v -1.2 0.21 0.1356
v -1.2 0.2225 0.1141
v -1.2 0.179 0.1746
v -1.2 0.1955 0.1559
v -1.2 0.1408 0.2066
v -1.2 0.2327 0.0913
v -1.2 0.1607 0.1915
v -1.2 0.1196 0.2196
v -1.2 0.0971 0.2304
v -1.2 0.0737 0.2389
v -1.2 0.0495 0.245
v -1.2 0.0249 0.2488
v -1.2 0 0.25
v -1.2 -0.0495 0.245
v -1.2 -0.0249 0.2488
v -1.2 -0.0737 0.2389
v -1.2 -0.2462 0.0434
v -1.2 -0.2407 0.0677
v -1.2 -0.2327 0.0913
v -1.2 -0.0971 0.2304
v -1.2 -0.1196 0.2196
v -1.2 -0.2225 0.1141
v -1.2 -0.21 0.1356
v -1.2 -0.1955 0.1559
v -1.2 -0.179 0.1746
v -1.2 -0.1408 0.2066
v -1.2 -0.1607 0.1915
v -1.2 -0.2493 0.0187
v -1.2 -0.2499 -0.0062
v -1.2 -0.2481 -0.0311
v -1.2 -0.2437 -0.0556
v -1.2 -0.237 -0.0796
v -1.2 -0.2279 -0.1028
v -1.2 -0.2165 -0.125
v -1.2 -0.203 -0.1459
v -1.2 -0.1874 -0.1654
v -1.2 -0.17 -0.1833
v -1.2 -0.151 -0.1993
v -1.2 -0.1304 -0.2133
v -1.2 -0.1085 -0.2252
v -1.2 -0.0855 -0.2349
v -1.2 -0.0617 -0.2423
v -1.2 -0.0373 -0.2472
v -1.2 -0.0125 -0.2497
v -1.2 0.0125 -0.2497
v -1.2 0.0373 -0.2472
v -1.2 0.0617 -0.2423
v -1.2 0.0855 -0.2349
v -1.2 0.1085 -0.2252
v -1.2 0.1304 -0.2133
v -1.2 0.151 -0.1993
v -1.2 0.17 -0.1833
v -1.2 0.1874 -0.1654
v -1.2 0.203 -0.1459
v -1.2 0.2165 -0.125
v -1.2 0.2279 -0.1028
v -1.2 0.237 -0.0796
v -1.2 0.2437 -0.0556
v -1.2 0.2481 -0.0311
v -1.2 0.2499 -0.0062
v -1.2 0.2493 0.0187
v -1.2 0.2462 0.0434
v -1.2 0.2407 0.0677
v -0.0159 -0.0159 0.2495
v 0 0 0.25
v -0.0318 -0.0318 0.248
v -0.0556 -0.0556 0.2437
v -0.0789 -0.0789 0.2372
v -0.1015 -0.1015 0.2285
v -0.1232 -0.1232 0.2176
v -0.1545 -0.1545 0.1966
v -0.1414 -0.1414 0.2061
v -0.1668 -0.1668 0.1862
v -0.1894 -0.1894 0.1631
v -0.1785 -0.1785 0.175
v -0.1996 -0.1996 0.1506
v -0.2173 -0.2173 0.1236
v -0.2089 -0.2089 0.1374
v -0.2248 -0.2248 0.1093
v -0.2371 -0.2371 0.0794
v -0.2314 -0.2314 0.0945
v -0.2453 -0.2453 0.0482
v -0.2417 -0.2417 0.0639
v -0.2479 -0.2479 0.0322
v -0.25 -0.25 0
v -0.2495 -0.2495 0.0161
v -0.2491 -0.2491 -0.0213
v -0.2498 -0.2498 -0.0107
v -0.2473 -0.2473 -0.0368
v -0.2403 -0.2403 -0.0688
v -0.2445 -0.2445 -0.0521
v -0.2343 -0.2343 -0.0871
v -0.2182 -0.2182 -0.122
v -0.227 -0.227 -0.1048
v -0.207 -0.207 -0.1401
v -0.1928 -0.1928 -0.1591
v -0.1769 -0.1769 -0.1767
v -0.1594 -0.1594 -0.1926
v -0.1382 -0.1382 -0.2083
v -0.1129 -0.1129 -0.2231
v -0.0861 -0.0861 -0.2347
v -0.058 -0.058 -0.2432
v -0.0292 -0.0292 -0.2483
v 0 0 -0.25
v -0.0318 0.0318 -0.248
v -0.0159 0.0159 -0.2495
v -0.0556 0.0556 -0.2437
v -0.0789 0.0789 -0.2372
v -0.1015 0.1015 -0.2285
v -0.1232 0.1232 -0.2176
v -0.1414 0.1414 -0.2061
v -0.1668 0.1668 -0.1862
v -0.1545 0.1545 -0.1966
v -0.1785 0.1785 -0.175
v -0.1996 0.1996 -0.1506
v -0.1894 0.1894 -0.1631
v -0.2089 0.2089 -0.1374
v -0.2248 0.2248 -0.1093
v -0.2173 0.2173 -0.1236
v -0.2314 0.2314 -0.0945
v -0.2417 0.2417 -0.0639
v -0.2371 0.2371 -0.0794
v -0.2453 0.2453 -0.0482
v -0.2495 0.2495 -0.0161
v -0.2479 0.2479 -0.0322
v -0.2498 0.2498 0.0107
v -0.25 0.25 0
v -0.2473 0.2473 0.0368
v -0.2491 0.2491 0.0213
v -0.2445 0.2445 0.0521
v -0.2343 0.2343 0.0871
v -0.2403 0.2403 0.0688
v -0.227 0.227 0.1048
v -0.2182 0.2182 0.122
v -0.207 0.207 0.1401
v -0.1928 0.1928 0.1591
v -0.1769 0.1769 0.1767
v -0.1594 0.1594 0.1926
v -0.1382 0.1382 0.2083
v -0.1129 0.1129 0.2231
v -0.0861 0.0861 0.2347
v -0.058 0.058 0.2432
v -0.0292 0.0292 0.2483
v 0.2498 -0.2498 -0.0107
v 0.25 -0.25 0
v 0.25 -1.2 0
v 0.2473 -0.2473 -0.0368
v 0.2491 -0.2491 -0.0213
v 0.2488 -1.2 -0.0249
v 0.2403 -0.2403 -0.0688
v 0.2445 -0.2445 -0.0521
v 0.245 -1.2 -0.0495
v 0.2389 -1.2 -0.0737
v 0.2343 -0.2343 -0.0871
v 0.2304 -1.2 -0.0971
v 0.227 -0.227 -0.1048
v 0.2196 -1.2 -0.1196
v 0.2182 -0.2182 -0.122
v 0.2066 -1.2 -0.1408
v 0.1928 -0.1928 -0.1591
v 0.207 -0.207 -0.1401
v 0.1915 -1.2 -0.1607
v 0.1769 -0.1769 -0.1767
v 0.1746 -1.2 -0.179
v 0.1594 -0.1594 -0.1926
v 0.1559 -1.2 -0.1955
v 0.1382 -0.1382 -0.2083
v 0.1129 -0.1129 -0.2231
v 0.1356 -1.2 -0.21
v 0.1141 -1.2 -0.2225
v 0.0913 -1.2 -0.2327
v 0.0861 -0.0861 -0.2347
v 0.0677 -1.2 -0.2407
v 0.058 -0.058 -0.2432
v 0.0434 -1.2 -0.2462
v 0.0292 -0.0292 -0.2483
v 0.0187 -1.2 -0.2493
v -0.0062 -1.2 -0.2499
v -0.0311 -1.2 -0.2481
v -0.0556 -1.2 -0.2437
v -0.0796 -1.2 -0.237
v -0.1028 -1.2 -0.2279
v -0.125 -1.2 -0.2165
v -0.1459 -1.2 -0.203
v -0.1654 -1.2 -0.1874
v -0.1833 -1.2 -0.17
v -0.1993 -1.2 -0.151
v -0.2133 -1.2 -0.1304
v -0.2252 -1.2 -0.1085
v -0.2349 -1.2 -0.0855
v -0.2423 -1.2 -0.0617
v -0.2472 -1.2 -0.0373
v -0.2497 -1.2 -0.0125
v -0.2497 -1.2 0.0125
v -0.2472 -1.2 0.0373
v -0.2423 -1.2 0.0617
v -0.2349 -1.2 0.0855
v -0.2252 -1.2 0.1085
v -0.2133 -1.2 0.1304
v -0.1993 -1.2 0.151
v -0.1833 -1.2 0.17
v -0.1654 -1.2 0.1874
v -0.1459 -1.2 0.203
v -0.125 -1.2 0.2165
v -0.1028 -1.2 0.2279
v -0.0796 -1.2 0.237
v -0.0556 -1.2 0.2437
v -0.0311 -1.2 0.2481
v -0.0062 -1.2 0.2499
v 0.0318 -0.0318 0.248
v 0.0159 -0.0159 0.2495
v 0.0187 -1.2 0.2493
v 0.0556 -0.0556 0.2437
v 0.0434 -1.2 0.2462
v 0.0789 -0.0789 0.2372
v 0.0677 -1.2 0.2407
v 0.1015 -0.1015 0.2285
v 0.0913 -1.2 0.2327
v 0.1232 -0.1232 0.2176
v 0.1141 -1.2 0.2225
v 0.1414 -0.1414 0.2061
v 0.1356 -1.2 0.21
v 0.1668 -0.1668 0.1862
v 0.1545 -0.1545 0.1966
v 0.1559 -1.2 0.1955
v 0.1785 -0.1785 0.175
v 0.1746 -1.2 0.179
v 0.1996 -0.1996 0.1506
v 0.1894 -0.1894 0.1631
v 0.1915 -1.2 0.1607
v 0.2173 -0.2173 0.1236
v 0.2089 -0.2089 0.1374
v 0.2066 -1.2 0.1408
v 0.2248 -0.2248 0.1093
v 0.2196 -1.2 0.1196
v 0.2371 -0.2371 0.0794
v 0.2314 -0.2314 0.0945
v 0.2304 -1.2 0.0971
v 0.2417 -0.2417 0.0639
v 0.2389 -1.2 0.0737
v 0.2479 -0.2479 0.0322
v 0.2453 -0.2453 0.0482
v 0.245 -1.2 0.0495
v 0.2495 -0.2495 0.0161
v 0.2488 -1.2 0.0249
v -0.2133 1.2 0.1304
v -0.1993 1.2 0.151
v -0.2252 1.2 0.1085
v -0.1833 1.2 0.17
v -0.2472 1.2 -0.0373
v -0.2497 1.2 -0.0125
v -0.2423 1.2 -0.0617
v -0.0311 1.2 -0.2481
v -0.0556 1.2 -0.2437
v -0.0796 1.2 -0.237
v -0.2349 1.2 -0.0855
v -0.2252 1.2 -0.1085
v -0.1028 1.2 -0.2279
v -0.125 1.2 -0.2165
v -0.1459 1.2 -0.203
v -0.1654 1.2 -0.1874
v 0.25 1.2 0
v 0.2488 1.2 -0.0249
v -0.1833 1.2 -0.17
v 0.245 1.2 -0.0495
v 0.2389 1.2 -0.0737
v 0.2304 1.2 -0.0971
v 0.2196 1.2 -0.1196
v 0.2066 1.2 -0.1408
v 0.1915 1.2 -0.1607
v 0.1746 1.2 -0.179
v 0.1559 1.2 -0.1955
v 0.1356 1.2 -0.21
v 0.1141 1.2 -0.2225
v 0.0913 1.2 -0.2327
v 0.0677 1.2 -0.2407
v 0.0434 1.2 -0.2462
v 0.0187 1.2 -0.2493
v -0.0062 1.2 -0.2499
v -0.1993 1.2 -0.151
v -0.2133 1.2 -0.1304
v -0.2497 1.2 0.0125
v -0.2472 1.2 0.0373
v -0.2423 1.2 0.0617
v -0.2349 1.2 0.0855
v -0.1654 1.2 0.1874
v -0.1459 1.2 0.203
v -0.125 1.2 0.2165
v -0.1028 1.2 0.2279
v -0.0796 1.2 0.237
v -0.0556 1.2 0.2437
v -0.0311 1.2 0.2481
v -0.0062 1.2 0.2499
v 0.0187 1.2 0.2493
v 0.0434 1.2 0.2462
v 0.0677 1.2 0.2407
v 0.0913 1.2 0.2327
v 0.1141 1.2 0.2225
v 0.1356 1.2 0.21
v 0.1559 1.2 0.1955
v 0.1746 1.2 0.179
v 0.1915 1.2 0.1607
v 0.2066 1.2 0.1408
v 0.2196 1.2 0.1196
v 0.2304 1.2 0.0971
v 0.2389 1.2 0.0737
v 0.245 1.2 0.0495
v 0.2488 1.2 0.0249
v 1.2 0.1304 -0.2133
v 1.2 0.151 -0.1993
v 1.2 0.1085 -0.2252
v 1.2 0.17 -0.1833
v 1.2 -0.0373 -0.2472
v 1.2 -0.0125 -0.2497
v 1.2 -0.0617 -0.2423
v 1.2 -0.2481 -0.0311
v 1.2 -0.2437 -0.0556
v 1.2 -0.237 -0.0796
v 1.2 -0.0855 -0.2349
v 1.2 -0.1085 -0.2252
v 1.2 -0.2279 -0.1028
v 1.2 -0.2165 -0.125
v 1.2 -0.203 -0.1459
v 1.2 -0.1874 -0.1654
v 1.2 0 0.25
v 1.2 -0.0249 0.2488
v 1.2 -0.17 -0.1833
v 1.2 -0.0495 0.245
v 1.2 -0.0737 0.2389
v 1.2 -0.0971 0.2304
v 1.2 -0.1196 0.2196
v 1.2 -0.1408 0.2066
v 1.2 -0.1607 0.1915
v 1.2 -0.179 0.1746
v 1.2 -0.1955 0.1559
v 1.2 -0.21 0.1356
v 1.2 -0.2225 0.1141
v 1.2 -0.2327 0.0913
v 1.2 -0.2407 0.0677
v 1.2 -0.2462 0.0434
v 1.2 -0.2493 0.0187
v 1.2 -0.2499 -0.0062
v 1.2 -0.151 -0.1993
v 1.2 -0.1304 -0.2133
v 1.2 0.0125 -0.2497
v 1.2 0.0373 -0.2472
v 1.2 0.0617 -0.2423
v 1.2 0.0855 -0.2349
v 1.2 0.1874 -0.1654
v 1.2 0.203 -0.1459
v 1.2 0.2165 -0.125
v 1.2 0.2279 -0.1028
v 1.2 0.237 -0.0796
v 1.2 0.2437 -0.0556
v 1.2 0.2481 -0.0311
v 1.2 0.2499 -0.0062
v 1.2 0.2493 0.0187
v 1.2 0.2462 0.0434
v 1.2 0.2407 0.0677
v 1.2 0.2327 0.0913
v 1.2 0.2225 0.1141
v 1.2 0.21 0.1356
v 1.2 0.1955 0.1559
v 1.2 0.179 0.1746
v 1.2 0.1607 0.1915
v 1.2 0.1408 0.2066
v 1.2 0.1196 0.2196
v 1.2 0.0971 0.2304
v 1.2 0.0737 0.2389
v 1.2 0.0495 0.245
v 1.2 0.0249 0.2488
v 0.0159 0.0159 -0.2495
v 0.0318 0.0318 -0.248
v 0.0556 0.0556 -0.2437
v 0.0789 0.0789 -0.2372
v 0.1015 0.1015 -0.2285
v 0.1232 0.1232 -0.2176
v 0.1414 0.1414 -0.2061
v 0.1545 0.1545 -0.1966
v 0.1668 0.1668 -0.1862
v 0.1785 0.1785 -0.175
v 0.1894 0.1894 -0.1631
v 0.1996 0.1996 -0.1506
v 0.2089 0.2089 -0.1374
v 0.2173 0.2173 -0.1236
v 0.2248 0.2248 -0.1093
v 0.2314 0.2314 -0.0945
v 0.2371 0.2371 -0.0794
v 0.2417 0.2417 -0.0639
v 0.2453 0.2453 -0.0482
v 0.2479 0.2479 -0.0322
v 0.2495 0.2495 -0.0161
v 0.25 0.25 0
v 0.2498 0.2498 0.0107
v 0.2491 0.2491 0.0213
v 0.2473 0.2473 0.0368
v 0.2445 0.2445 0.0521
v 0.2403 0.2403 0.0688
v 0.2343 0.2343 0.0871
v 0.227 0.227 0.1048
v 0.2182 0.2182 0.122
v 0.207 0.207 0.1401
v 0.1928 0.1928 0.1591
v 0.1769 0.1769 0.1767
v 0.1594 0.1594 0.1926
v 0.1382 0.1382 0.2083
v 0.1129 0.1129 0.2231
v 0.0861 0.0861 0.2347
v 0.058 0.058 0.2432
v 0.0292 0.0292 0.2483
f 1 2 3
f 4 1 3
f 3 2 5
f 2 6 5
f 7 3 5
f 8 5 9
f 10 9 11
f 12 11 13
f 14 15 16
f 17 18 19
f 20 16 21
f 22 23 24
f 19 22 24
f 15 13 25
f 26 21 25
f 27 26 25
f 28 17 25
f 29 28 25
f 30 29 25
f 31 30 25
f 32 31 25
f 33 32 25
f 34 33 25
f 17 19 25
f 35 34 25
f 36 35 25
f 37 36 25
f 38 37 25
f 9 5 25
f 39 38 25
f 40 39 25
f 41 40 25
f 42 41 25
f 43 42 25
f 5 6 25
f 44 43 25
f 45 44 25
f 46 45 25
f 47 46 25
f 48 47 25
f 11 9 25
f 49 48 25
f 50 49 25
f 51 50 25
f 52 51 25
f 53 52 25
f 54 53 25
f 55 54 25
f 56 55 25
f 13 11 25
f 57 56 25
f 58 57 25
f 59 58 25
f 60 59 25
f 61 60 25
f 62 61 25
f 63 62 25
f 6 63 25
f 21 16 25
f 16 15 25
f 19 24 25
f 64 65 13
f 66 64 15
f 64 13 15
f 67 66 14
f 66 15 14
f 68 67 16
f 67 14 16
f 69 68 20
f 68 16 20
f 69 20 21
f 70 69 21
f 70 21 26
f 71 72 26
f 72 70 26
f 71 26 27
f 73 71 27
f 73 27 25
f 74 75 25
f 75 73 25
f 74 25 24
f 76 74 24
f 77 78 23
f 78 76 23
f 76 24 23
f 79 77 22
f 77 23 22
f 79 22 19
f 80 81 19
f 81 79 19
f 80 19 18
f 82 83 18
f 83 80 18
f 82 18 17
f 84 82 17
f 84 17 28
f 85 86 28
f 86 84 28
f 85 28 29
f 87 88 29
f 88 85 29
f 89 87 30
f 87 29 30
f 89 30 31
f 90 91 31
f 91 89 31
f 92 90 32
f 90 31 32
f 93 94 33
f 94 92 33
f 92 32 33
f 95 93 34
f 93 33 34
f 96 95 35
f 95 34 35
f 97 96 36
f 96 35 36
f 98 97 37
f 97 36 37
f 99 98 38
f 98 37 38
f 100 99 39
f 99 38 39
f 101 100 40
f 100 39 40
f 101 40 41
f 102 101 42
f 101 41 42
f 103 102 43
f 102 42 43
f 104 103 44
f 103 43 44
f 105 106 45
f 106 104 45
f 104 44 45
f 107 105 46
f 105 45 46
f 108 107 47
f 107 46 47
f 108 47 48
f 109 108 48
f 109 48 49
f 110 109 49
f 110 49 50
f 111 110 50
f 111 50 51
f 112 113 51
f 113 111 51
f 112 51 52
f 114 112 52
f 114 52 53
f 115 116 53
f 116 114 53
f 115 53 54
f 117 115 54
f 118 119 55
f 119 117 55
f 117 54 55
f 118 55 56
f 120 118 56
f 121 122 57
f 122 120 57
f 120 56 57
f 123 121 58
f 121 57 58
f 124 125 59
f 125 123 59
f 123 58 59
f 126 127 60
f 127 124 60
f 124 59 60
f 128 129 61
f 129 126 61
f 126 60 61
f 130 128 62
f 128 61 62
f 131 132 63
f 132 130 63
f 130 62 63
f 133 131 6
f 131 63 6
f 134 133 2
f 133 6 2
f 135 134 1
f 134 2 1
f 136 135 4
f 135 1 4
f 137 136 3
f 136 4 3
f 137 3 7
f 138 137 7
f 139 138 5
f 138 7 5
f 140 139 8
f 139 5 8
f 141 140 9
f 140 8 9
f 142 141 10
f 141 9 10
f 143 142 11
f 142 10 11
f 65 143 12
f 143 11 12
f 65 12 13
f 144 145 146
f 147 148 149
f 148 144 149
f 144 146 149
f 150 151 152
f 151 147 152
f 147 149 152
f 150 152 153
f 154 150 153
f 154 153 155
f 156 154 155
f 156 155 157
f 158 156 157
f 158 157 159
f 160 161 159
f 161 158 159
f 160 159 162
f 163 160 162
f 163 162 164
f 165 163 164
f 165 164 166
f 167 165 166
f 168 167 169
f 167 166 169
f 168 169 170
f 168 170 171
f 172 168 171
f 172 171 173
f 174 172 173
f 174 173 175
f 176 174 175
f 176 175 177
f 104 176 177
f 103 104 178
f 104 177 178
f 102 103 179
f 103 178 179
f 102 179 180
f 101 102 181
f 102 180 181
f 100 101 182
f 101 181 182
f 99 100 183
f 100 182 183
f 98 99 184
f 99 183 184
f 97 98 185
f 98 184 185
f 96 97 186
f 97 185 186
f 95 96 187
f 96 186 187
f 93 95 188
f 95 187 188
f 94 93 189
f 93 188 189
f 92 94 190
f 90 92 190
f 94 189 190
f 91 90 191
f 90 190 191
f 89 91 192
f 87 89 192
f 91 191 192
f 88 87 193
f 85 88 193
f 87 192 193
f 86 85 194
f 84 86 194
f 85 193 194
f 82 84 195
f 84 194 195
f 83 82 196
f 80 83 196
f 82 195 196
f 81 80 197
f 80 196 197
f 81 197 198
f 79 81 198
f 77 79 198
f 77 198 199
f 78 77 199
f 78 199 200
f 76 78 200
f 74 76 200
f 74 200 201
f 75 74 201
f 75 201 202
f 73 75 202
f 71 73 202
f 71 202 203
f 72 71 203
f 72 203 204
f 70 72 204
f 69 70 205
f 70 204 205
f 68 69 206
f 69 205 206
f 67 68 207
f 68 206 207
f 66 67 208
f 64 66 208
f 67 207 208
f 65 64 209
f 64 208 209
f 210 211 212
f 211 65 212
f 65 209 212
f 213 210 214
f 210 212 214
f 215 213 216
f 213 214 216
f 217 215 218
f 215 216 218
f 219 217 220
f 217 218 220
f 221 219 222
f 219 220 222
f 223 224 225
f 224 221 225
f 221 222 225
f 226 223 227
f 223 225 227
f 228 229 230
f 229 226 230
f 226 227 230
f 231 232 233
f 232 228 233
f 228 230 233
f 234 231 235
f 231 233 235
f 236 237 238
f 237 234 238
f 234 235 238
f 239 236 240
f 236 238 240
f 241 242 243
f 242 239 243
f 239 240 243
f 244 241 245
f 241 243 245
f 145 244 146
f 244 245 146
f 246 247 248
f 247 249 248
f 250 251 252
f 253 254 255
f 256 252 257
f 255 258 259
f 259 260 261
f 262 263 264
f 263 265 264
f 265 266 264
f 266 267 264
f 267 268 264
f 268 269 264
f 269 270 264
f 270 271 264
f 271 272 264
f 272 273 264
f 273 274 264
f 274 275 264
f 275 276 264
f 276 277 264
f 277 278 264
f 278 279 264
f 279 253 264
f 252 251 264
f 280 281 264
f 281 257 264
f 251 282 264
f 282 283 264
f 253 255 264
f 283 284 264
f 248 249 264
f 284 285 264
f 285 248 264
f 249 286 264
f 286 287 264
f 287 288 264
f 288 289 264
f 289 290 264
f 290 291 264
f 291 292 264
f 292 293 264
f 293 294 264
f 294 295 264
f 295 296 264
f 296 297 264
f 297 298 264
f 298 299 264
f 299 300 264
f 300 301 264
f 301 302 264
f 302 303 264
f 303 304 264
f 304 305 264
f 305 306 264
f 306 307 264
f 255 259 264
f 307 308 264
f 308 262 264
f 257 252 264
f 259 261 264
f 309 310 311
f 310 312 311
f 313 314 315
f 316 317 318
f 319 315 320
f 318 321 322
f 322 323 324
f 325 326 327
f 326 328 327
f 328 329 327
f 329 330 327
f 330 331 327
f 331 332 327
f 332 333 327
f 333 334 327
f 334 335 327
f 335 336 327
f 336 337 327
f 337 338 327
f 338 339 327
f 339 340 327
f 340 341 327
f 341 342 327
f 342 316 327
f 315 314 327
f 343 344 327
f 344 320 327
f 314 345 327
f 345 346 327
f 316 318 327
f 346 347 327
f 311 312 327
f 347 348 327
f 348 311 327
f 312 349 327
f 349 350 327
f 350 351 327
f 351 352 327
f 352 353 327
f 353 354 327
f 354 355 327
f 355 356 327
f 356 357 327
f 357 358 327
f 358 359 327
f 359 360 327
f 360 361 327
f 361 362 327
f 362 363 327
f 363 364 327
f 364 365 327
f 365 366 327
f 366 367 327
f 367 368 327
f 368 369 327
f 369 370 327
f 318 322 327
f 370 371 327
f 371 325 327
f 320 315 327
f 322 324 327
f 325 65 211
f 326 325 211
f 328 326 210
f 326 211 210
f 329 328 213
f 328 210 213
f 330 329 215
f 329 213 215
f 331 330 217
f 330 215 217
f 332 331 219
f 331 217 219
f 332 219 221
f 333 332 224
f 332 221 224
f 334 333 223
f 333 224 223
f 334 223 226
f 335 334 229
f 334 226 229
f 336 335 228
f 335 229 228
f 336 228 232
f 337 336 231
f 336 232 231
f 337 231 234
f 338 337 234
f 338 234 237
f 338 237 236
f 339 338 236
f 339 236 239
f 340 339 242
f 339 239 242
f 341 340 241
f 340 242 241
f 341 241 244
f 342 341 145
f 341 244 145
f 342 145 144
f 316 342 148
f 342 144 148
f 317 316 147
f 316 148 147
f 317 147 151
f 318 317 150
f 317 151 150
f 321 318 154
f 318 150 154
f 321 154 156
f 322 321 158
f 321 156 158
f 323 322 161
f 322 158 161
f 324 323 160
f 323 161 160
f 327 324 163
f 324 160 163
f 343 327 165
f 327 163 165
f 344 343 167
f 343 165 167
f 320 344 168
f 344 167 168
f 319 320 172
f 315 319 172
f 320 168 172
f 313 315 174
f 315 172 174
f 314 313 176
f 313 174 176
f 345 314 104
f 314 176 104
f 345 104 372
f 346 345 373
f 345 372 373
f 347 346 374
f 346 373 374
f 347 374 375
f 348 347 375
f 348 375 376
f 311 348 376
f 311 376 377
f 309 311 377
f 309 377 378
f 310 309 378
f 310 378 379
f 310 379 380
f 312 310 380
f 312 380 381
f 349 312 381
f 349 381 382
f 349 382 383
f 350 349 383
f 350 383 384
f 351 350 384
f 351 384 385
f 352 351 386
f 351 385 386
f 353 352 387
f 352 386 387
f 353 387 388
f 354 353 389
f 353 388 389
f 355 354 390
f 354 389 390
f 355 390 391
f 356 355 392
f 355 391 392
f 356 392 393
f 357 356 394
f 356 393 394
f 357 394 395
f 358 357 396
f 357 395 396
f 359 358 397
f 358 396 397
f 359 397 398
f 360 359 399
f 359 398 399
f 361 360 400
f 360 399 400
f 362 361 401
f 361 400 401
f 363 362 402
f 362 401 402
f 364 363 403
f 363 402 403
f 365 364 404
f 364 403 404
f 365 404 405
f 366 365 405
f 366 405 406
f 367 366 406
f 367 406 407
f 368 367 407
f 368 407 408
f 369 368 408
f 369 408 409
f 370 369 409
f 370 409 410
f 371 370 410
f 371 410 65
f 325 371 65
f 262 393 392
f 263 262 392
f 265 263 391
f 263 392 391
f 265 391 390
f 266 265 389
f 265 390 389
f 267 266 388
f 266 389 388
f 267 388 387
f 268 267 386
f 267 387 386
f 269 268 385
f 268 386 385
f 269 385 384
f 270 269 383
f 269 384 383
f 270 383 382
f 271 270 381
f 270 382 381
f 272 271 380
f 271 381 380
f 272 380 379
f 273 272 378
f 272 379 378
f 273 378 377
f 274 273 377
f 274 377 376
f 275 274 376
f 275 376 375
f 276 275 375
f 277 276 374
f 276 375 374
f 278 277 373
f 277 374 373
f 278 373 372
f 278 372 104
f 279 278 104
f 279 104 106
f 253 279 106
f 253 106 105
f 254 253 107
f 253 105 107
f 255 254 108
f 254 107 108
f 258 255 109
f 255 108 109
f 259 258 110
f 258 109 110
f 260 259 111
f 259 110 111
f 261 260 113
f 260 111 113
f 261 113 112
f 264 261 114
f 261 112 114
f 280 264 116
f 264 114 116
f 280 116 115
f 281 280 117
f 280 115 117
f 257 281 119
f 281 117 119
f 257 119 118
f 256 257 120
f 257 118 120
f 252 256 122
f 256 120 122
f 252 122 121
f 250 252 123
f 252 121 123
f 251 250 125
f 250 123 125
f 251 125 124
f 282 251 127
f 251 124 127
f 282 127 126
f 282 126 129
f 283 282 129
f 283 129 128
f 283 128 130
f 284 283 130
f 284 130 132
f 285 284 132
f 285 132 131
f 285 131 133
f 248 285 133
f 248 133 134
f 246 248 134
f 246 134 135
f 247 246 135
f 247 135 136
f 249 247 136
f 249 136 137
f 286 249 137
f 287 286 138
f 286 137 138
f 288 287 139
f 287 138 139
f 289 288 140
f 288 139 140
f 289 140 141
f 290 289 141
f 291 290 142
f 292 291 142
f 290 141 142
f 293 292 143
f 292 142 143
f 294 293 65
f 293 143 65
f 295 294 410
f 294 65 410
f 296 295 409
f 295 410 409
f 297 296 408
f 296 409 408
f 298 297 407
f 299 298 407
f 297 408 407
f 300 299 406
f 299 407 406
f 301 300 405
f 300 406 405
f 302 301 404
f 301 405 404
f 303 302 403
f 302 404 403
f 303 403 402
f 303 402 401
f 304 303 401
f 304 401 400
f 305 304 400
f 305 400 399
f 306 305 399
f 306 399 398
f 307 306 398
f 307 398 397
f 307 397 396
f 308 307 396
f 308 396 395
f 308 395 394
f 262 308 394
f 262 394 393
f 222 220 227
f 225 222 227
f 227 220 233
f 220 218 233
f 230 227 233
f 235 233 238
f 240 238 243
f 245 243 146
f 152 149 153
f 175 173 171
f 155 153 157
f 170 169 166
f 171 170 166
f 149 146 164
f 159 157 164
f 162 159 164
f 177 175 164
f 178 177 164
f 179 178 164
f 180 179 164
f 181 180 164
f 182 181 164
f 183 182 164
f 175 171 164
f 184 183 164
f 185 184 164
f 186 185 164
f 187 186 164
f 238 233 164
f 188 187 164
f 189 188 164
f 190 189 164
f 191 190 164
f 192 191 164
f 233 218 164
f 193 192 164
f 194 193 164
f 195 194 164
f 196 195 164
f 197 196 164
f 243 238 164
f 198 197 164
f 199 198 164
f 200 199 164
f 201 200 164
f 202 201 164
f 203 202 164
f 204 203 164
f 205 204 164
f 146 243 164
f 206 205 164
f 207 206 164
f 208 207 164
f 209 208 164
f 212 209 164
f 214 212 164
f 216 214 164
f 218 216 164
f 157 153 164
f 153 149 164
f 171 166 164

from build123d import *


with BuildPart() as part:
    # 草图4 → 旋转5 (revolve)
    with BuildSketch(Plane(origin=(0, 0, 0), x_dir=(1, 0, 0), z_dir=(0, 1, 0))):
        Polygon((0, 0), (1.2, 0), (1.2, -0.25), (-1.2, -0.25), (-1.2, 0), align=None)
    revolve(axis=Axis((-1.2, 0, 0), (1, 0, 0)))

    # 草图5 → 旋转6 (revolve)
    with BuildSketch(Plane.XY):
        Polygon((0, 0), (0, 1.2), (0.25, 1.2), (0.25, -1.2), (0, -1.2), align=None)
    revolve(axis=Axis((0, 0, 0), (0, 1, 0)))


solid = part.part
